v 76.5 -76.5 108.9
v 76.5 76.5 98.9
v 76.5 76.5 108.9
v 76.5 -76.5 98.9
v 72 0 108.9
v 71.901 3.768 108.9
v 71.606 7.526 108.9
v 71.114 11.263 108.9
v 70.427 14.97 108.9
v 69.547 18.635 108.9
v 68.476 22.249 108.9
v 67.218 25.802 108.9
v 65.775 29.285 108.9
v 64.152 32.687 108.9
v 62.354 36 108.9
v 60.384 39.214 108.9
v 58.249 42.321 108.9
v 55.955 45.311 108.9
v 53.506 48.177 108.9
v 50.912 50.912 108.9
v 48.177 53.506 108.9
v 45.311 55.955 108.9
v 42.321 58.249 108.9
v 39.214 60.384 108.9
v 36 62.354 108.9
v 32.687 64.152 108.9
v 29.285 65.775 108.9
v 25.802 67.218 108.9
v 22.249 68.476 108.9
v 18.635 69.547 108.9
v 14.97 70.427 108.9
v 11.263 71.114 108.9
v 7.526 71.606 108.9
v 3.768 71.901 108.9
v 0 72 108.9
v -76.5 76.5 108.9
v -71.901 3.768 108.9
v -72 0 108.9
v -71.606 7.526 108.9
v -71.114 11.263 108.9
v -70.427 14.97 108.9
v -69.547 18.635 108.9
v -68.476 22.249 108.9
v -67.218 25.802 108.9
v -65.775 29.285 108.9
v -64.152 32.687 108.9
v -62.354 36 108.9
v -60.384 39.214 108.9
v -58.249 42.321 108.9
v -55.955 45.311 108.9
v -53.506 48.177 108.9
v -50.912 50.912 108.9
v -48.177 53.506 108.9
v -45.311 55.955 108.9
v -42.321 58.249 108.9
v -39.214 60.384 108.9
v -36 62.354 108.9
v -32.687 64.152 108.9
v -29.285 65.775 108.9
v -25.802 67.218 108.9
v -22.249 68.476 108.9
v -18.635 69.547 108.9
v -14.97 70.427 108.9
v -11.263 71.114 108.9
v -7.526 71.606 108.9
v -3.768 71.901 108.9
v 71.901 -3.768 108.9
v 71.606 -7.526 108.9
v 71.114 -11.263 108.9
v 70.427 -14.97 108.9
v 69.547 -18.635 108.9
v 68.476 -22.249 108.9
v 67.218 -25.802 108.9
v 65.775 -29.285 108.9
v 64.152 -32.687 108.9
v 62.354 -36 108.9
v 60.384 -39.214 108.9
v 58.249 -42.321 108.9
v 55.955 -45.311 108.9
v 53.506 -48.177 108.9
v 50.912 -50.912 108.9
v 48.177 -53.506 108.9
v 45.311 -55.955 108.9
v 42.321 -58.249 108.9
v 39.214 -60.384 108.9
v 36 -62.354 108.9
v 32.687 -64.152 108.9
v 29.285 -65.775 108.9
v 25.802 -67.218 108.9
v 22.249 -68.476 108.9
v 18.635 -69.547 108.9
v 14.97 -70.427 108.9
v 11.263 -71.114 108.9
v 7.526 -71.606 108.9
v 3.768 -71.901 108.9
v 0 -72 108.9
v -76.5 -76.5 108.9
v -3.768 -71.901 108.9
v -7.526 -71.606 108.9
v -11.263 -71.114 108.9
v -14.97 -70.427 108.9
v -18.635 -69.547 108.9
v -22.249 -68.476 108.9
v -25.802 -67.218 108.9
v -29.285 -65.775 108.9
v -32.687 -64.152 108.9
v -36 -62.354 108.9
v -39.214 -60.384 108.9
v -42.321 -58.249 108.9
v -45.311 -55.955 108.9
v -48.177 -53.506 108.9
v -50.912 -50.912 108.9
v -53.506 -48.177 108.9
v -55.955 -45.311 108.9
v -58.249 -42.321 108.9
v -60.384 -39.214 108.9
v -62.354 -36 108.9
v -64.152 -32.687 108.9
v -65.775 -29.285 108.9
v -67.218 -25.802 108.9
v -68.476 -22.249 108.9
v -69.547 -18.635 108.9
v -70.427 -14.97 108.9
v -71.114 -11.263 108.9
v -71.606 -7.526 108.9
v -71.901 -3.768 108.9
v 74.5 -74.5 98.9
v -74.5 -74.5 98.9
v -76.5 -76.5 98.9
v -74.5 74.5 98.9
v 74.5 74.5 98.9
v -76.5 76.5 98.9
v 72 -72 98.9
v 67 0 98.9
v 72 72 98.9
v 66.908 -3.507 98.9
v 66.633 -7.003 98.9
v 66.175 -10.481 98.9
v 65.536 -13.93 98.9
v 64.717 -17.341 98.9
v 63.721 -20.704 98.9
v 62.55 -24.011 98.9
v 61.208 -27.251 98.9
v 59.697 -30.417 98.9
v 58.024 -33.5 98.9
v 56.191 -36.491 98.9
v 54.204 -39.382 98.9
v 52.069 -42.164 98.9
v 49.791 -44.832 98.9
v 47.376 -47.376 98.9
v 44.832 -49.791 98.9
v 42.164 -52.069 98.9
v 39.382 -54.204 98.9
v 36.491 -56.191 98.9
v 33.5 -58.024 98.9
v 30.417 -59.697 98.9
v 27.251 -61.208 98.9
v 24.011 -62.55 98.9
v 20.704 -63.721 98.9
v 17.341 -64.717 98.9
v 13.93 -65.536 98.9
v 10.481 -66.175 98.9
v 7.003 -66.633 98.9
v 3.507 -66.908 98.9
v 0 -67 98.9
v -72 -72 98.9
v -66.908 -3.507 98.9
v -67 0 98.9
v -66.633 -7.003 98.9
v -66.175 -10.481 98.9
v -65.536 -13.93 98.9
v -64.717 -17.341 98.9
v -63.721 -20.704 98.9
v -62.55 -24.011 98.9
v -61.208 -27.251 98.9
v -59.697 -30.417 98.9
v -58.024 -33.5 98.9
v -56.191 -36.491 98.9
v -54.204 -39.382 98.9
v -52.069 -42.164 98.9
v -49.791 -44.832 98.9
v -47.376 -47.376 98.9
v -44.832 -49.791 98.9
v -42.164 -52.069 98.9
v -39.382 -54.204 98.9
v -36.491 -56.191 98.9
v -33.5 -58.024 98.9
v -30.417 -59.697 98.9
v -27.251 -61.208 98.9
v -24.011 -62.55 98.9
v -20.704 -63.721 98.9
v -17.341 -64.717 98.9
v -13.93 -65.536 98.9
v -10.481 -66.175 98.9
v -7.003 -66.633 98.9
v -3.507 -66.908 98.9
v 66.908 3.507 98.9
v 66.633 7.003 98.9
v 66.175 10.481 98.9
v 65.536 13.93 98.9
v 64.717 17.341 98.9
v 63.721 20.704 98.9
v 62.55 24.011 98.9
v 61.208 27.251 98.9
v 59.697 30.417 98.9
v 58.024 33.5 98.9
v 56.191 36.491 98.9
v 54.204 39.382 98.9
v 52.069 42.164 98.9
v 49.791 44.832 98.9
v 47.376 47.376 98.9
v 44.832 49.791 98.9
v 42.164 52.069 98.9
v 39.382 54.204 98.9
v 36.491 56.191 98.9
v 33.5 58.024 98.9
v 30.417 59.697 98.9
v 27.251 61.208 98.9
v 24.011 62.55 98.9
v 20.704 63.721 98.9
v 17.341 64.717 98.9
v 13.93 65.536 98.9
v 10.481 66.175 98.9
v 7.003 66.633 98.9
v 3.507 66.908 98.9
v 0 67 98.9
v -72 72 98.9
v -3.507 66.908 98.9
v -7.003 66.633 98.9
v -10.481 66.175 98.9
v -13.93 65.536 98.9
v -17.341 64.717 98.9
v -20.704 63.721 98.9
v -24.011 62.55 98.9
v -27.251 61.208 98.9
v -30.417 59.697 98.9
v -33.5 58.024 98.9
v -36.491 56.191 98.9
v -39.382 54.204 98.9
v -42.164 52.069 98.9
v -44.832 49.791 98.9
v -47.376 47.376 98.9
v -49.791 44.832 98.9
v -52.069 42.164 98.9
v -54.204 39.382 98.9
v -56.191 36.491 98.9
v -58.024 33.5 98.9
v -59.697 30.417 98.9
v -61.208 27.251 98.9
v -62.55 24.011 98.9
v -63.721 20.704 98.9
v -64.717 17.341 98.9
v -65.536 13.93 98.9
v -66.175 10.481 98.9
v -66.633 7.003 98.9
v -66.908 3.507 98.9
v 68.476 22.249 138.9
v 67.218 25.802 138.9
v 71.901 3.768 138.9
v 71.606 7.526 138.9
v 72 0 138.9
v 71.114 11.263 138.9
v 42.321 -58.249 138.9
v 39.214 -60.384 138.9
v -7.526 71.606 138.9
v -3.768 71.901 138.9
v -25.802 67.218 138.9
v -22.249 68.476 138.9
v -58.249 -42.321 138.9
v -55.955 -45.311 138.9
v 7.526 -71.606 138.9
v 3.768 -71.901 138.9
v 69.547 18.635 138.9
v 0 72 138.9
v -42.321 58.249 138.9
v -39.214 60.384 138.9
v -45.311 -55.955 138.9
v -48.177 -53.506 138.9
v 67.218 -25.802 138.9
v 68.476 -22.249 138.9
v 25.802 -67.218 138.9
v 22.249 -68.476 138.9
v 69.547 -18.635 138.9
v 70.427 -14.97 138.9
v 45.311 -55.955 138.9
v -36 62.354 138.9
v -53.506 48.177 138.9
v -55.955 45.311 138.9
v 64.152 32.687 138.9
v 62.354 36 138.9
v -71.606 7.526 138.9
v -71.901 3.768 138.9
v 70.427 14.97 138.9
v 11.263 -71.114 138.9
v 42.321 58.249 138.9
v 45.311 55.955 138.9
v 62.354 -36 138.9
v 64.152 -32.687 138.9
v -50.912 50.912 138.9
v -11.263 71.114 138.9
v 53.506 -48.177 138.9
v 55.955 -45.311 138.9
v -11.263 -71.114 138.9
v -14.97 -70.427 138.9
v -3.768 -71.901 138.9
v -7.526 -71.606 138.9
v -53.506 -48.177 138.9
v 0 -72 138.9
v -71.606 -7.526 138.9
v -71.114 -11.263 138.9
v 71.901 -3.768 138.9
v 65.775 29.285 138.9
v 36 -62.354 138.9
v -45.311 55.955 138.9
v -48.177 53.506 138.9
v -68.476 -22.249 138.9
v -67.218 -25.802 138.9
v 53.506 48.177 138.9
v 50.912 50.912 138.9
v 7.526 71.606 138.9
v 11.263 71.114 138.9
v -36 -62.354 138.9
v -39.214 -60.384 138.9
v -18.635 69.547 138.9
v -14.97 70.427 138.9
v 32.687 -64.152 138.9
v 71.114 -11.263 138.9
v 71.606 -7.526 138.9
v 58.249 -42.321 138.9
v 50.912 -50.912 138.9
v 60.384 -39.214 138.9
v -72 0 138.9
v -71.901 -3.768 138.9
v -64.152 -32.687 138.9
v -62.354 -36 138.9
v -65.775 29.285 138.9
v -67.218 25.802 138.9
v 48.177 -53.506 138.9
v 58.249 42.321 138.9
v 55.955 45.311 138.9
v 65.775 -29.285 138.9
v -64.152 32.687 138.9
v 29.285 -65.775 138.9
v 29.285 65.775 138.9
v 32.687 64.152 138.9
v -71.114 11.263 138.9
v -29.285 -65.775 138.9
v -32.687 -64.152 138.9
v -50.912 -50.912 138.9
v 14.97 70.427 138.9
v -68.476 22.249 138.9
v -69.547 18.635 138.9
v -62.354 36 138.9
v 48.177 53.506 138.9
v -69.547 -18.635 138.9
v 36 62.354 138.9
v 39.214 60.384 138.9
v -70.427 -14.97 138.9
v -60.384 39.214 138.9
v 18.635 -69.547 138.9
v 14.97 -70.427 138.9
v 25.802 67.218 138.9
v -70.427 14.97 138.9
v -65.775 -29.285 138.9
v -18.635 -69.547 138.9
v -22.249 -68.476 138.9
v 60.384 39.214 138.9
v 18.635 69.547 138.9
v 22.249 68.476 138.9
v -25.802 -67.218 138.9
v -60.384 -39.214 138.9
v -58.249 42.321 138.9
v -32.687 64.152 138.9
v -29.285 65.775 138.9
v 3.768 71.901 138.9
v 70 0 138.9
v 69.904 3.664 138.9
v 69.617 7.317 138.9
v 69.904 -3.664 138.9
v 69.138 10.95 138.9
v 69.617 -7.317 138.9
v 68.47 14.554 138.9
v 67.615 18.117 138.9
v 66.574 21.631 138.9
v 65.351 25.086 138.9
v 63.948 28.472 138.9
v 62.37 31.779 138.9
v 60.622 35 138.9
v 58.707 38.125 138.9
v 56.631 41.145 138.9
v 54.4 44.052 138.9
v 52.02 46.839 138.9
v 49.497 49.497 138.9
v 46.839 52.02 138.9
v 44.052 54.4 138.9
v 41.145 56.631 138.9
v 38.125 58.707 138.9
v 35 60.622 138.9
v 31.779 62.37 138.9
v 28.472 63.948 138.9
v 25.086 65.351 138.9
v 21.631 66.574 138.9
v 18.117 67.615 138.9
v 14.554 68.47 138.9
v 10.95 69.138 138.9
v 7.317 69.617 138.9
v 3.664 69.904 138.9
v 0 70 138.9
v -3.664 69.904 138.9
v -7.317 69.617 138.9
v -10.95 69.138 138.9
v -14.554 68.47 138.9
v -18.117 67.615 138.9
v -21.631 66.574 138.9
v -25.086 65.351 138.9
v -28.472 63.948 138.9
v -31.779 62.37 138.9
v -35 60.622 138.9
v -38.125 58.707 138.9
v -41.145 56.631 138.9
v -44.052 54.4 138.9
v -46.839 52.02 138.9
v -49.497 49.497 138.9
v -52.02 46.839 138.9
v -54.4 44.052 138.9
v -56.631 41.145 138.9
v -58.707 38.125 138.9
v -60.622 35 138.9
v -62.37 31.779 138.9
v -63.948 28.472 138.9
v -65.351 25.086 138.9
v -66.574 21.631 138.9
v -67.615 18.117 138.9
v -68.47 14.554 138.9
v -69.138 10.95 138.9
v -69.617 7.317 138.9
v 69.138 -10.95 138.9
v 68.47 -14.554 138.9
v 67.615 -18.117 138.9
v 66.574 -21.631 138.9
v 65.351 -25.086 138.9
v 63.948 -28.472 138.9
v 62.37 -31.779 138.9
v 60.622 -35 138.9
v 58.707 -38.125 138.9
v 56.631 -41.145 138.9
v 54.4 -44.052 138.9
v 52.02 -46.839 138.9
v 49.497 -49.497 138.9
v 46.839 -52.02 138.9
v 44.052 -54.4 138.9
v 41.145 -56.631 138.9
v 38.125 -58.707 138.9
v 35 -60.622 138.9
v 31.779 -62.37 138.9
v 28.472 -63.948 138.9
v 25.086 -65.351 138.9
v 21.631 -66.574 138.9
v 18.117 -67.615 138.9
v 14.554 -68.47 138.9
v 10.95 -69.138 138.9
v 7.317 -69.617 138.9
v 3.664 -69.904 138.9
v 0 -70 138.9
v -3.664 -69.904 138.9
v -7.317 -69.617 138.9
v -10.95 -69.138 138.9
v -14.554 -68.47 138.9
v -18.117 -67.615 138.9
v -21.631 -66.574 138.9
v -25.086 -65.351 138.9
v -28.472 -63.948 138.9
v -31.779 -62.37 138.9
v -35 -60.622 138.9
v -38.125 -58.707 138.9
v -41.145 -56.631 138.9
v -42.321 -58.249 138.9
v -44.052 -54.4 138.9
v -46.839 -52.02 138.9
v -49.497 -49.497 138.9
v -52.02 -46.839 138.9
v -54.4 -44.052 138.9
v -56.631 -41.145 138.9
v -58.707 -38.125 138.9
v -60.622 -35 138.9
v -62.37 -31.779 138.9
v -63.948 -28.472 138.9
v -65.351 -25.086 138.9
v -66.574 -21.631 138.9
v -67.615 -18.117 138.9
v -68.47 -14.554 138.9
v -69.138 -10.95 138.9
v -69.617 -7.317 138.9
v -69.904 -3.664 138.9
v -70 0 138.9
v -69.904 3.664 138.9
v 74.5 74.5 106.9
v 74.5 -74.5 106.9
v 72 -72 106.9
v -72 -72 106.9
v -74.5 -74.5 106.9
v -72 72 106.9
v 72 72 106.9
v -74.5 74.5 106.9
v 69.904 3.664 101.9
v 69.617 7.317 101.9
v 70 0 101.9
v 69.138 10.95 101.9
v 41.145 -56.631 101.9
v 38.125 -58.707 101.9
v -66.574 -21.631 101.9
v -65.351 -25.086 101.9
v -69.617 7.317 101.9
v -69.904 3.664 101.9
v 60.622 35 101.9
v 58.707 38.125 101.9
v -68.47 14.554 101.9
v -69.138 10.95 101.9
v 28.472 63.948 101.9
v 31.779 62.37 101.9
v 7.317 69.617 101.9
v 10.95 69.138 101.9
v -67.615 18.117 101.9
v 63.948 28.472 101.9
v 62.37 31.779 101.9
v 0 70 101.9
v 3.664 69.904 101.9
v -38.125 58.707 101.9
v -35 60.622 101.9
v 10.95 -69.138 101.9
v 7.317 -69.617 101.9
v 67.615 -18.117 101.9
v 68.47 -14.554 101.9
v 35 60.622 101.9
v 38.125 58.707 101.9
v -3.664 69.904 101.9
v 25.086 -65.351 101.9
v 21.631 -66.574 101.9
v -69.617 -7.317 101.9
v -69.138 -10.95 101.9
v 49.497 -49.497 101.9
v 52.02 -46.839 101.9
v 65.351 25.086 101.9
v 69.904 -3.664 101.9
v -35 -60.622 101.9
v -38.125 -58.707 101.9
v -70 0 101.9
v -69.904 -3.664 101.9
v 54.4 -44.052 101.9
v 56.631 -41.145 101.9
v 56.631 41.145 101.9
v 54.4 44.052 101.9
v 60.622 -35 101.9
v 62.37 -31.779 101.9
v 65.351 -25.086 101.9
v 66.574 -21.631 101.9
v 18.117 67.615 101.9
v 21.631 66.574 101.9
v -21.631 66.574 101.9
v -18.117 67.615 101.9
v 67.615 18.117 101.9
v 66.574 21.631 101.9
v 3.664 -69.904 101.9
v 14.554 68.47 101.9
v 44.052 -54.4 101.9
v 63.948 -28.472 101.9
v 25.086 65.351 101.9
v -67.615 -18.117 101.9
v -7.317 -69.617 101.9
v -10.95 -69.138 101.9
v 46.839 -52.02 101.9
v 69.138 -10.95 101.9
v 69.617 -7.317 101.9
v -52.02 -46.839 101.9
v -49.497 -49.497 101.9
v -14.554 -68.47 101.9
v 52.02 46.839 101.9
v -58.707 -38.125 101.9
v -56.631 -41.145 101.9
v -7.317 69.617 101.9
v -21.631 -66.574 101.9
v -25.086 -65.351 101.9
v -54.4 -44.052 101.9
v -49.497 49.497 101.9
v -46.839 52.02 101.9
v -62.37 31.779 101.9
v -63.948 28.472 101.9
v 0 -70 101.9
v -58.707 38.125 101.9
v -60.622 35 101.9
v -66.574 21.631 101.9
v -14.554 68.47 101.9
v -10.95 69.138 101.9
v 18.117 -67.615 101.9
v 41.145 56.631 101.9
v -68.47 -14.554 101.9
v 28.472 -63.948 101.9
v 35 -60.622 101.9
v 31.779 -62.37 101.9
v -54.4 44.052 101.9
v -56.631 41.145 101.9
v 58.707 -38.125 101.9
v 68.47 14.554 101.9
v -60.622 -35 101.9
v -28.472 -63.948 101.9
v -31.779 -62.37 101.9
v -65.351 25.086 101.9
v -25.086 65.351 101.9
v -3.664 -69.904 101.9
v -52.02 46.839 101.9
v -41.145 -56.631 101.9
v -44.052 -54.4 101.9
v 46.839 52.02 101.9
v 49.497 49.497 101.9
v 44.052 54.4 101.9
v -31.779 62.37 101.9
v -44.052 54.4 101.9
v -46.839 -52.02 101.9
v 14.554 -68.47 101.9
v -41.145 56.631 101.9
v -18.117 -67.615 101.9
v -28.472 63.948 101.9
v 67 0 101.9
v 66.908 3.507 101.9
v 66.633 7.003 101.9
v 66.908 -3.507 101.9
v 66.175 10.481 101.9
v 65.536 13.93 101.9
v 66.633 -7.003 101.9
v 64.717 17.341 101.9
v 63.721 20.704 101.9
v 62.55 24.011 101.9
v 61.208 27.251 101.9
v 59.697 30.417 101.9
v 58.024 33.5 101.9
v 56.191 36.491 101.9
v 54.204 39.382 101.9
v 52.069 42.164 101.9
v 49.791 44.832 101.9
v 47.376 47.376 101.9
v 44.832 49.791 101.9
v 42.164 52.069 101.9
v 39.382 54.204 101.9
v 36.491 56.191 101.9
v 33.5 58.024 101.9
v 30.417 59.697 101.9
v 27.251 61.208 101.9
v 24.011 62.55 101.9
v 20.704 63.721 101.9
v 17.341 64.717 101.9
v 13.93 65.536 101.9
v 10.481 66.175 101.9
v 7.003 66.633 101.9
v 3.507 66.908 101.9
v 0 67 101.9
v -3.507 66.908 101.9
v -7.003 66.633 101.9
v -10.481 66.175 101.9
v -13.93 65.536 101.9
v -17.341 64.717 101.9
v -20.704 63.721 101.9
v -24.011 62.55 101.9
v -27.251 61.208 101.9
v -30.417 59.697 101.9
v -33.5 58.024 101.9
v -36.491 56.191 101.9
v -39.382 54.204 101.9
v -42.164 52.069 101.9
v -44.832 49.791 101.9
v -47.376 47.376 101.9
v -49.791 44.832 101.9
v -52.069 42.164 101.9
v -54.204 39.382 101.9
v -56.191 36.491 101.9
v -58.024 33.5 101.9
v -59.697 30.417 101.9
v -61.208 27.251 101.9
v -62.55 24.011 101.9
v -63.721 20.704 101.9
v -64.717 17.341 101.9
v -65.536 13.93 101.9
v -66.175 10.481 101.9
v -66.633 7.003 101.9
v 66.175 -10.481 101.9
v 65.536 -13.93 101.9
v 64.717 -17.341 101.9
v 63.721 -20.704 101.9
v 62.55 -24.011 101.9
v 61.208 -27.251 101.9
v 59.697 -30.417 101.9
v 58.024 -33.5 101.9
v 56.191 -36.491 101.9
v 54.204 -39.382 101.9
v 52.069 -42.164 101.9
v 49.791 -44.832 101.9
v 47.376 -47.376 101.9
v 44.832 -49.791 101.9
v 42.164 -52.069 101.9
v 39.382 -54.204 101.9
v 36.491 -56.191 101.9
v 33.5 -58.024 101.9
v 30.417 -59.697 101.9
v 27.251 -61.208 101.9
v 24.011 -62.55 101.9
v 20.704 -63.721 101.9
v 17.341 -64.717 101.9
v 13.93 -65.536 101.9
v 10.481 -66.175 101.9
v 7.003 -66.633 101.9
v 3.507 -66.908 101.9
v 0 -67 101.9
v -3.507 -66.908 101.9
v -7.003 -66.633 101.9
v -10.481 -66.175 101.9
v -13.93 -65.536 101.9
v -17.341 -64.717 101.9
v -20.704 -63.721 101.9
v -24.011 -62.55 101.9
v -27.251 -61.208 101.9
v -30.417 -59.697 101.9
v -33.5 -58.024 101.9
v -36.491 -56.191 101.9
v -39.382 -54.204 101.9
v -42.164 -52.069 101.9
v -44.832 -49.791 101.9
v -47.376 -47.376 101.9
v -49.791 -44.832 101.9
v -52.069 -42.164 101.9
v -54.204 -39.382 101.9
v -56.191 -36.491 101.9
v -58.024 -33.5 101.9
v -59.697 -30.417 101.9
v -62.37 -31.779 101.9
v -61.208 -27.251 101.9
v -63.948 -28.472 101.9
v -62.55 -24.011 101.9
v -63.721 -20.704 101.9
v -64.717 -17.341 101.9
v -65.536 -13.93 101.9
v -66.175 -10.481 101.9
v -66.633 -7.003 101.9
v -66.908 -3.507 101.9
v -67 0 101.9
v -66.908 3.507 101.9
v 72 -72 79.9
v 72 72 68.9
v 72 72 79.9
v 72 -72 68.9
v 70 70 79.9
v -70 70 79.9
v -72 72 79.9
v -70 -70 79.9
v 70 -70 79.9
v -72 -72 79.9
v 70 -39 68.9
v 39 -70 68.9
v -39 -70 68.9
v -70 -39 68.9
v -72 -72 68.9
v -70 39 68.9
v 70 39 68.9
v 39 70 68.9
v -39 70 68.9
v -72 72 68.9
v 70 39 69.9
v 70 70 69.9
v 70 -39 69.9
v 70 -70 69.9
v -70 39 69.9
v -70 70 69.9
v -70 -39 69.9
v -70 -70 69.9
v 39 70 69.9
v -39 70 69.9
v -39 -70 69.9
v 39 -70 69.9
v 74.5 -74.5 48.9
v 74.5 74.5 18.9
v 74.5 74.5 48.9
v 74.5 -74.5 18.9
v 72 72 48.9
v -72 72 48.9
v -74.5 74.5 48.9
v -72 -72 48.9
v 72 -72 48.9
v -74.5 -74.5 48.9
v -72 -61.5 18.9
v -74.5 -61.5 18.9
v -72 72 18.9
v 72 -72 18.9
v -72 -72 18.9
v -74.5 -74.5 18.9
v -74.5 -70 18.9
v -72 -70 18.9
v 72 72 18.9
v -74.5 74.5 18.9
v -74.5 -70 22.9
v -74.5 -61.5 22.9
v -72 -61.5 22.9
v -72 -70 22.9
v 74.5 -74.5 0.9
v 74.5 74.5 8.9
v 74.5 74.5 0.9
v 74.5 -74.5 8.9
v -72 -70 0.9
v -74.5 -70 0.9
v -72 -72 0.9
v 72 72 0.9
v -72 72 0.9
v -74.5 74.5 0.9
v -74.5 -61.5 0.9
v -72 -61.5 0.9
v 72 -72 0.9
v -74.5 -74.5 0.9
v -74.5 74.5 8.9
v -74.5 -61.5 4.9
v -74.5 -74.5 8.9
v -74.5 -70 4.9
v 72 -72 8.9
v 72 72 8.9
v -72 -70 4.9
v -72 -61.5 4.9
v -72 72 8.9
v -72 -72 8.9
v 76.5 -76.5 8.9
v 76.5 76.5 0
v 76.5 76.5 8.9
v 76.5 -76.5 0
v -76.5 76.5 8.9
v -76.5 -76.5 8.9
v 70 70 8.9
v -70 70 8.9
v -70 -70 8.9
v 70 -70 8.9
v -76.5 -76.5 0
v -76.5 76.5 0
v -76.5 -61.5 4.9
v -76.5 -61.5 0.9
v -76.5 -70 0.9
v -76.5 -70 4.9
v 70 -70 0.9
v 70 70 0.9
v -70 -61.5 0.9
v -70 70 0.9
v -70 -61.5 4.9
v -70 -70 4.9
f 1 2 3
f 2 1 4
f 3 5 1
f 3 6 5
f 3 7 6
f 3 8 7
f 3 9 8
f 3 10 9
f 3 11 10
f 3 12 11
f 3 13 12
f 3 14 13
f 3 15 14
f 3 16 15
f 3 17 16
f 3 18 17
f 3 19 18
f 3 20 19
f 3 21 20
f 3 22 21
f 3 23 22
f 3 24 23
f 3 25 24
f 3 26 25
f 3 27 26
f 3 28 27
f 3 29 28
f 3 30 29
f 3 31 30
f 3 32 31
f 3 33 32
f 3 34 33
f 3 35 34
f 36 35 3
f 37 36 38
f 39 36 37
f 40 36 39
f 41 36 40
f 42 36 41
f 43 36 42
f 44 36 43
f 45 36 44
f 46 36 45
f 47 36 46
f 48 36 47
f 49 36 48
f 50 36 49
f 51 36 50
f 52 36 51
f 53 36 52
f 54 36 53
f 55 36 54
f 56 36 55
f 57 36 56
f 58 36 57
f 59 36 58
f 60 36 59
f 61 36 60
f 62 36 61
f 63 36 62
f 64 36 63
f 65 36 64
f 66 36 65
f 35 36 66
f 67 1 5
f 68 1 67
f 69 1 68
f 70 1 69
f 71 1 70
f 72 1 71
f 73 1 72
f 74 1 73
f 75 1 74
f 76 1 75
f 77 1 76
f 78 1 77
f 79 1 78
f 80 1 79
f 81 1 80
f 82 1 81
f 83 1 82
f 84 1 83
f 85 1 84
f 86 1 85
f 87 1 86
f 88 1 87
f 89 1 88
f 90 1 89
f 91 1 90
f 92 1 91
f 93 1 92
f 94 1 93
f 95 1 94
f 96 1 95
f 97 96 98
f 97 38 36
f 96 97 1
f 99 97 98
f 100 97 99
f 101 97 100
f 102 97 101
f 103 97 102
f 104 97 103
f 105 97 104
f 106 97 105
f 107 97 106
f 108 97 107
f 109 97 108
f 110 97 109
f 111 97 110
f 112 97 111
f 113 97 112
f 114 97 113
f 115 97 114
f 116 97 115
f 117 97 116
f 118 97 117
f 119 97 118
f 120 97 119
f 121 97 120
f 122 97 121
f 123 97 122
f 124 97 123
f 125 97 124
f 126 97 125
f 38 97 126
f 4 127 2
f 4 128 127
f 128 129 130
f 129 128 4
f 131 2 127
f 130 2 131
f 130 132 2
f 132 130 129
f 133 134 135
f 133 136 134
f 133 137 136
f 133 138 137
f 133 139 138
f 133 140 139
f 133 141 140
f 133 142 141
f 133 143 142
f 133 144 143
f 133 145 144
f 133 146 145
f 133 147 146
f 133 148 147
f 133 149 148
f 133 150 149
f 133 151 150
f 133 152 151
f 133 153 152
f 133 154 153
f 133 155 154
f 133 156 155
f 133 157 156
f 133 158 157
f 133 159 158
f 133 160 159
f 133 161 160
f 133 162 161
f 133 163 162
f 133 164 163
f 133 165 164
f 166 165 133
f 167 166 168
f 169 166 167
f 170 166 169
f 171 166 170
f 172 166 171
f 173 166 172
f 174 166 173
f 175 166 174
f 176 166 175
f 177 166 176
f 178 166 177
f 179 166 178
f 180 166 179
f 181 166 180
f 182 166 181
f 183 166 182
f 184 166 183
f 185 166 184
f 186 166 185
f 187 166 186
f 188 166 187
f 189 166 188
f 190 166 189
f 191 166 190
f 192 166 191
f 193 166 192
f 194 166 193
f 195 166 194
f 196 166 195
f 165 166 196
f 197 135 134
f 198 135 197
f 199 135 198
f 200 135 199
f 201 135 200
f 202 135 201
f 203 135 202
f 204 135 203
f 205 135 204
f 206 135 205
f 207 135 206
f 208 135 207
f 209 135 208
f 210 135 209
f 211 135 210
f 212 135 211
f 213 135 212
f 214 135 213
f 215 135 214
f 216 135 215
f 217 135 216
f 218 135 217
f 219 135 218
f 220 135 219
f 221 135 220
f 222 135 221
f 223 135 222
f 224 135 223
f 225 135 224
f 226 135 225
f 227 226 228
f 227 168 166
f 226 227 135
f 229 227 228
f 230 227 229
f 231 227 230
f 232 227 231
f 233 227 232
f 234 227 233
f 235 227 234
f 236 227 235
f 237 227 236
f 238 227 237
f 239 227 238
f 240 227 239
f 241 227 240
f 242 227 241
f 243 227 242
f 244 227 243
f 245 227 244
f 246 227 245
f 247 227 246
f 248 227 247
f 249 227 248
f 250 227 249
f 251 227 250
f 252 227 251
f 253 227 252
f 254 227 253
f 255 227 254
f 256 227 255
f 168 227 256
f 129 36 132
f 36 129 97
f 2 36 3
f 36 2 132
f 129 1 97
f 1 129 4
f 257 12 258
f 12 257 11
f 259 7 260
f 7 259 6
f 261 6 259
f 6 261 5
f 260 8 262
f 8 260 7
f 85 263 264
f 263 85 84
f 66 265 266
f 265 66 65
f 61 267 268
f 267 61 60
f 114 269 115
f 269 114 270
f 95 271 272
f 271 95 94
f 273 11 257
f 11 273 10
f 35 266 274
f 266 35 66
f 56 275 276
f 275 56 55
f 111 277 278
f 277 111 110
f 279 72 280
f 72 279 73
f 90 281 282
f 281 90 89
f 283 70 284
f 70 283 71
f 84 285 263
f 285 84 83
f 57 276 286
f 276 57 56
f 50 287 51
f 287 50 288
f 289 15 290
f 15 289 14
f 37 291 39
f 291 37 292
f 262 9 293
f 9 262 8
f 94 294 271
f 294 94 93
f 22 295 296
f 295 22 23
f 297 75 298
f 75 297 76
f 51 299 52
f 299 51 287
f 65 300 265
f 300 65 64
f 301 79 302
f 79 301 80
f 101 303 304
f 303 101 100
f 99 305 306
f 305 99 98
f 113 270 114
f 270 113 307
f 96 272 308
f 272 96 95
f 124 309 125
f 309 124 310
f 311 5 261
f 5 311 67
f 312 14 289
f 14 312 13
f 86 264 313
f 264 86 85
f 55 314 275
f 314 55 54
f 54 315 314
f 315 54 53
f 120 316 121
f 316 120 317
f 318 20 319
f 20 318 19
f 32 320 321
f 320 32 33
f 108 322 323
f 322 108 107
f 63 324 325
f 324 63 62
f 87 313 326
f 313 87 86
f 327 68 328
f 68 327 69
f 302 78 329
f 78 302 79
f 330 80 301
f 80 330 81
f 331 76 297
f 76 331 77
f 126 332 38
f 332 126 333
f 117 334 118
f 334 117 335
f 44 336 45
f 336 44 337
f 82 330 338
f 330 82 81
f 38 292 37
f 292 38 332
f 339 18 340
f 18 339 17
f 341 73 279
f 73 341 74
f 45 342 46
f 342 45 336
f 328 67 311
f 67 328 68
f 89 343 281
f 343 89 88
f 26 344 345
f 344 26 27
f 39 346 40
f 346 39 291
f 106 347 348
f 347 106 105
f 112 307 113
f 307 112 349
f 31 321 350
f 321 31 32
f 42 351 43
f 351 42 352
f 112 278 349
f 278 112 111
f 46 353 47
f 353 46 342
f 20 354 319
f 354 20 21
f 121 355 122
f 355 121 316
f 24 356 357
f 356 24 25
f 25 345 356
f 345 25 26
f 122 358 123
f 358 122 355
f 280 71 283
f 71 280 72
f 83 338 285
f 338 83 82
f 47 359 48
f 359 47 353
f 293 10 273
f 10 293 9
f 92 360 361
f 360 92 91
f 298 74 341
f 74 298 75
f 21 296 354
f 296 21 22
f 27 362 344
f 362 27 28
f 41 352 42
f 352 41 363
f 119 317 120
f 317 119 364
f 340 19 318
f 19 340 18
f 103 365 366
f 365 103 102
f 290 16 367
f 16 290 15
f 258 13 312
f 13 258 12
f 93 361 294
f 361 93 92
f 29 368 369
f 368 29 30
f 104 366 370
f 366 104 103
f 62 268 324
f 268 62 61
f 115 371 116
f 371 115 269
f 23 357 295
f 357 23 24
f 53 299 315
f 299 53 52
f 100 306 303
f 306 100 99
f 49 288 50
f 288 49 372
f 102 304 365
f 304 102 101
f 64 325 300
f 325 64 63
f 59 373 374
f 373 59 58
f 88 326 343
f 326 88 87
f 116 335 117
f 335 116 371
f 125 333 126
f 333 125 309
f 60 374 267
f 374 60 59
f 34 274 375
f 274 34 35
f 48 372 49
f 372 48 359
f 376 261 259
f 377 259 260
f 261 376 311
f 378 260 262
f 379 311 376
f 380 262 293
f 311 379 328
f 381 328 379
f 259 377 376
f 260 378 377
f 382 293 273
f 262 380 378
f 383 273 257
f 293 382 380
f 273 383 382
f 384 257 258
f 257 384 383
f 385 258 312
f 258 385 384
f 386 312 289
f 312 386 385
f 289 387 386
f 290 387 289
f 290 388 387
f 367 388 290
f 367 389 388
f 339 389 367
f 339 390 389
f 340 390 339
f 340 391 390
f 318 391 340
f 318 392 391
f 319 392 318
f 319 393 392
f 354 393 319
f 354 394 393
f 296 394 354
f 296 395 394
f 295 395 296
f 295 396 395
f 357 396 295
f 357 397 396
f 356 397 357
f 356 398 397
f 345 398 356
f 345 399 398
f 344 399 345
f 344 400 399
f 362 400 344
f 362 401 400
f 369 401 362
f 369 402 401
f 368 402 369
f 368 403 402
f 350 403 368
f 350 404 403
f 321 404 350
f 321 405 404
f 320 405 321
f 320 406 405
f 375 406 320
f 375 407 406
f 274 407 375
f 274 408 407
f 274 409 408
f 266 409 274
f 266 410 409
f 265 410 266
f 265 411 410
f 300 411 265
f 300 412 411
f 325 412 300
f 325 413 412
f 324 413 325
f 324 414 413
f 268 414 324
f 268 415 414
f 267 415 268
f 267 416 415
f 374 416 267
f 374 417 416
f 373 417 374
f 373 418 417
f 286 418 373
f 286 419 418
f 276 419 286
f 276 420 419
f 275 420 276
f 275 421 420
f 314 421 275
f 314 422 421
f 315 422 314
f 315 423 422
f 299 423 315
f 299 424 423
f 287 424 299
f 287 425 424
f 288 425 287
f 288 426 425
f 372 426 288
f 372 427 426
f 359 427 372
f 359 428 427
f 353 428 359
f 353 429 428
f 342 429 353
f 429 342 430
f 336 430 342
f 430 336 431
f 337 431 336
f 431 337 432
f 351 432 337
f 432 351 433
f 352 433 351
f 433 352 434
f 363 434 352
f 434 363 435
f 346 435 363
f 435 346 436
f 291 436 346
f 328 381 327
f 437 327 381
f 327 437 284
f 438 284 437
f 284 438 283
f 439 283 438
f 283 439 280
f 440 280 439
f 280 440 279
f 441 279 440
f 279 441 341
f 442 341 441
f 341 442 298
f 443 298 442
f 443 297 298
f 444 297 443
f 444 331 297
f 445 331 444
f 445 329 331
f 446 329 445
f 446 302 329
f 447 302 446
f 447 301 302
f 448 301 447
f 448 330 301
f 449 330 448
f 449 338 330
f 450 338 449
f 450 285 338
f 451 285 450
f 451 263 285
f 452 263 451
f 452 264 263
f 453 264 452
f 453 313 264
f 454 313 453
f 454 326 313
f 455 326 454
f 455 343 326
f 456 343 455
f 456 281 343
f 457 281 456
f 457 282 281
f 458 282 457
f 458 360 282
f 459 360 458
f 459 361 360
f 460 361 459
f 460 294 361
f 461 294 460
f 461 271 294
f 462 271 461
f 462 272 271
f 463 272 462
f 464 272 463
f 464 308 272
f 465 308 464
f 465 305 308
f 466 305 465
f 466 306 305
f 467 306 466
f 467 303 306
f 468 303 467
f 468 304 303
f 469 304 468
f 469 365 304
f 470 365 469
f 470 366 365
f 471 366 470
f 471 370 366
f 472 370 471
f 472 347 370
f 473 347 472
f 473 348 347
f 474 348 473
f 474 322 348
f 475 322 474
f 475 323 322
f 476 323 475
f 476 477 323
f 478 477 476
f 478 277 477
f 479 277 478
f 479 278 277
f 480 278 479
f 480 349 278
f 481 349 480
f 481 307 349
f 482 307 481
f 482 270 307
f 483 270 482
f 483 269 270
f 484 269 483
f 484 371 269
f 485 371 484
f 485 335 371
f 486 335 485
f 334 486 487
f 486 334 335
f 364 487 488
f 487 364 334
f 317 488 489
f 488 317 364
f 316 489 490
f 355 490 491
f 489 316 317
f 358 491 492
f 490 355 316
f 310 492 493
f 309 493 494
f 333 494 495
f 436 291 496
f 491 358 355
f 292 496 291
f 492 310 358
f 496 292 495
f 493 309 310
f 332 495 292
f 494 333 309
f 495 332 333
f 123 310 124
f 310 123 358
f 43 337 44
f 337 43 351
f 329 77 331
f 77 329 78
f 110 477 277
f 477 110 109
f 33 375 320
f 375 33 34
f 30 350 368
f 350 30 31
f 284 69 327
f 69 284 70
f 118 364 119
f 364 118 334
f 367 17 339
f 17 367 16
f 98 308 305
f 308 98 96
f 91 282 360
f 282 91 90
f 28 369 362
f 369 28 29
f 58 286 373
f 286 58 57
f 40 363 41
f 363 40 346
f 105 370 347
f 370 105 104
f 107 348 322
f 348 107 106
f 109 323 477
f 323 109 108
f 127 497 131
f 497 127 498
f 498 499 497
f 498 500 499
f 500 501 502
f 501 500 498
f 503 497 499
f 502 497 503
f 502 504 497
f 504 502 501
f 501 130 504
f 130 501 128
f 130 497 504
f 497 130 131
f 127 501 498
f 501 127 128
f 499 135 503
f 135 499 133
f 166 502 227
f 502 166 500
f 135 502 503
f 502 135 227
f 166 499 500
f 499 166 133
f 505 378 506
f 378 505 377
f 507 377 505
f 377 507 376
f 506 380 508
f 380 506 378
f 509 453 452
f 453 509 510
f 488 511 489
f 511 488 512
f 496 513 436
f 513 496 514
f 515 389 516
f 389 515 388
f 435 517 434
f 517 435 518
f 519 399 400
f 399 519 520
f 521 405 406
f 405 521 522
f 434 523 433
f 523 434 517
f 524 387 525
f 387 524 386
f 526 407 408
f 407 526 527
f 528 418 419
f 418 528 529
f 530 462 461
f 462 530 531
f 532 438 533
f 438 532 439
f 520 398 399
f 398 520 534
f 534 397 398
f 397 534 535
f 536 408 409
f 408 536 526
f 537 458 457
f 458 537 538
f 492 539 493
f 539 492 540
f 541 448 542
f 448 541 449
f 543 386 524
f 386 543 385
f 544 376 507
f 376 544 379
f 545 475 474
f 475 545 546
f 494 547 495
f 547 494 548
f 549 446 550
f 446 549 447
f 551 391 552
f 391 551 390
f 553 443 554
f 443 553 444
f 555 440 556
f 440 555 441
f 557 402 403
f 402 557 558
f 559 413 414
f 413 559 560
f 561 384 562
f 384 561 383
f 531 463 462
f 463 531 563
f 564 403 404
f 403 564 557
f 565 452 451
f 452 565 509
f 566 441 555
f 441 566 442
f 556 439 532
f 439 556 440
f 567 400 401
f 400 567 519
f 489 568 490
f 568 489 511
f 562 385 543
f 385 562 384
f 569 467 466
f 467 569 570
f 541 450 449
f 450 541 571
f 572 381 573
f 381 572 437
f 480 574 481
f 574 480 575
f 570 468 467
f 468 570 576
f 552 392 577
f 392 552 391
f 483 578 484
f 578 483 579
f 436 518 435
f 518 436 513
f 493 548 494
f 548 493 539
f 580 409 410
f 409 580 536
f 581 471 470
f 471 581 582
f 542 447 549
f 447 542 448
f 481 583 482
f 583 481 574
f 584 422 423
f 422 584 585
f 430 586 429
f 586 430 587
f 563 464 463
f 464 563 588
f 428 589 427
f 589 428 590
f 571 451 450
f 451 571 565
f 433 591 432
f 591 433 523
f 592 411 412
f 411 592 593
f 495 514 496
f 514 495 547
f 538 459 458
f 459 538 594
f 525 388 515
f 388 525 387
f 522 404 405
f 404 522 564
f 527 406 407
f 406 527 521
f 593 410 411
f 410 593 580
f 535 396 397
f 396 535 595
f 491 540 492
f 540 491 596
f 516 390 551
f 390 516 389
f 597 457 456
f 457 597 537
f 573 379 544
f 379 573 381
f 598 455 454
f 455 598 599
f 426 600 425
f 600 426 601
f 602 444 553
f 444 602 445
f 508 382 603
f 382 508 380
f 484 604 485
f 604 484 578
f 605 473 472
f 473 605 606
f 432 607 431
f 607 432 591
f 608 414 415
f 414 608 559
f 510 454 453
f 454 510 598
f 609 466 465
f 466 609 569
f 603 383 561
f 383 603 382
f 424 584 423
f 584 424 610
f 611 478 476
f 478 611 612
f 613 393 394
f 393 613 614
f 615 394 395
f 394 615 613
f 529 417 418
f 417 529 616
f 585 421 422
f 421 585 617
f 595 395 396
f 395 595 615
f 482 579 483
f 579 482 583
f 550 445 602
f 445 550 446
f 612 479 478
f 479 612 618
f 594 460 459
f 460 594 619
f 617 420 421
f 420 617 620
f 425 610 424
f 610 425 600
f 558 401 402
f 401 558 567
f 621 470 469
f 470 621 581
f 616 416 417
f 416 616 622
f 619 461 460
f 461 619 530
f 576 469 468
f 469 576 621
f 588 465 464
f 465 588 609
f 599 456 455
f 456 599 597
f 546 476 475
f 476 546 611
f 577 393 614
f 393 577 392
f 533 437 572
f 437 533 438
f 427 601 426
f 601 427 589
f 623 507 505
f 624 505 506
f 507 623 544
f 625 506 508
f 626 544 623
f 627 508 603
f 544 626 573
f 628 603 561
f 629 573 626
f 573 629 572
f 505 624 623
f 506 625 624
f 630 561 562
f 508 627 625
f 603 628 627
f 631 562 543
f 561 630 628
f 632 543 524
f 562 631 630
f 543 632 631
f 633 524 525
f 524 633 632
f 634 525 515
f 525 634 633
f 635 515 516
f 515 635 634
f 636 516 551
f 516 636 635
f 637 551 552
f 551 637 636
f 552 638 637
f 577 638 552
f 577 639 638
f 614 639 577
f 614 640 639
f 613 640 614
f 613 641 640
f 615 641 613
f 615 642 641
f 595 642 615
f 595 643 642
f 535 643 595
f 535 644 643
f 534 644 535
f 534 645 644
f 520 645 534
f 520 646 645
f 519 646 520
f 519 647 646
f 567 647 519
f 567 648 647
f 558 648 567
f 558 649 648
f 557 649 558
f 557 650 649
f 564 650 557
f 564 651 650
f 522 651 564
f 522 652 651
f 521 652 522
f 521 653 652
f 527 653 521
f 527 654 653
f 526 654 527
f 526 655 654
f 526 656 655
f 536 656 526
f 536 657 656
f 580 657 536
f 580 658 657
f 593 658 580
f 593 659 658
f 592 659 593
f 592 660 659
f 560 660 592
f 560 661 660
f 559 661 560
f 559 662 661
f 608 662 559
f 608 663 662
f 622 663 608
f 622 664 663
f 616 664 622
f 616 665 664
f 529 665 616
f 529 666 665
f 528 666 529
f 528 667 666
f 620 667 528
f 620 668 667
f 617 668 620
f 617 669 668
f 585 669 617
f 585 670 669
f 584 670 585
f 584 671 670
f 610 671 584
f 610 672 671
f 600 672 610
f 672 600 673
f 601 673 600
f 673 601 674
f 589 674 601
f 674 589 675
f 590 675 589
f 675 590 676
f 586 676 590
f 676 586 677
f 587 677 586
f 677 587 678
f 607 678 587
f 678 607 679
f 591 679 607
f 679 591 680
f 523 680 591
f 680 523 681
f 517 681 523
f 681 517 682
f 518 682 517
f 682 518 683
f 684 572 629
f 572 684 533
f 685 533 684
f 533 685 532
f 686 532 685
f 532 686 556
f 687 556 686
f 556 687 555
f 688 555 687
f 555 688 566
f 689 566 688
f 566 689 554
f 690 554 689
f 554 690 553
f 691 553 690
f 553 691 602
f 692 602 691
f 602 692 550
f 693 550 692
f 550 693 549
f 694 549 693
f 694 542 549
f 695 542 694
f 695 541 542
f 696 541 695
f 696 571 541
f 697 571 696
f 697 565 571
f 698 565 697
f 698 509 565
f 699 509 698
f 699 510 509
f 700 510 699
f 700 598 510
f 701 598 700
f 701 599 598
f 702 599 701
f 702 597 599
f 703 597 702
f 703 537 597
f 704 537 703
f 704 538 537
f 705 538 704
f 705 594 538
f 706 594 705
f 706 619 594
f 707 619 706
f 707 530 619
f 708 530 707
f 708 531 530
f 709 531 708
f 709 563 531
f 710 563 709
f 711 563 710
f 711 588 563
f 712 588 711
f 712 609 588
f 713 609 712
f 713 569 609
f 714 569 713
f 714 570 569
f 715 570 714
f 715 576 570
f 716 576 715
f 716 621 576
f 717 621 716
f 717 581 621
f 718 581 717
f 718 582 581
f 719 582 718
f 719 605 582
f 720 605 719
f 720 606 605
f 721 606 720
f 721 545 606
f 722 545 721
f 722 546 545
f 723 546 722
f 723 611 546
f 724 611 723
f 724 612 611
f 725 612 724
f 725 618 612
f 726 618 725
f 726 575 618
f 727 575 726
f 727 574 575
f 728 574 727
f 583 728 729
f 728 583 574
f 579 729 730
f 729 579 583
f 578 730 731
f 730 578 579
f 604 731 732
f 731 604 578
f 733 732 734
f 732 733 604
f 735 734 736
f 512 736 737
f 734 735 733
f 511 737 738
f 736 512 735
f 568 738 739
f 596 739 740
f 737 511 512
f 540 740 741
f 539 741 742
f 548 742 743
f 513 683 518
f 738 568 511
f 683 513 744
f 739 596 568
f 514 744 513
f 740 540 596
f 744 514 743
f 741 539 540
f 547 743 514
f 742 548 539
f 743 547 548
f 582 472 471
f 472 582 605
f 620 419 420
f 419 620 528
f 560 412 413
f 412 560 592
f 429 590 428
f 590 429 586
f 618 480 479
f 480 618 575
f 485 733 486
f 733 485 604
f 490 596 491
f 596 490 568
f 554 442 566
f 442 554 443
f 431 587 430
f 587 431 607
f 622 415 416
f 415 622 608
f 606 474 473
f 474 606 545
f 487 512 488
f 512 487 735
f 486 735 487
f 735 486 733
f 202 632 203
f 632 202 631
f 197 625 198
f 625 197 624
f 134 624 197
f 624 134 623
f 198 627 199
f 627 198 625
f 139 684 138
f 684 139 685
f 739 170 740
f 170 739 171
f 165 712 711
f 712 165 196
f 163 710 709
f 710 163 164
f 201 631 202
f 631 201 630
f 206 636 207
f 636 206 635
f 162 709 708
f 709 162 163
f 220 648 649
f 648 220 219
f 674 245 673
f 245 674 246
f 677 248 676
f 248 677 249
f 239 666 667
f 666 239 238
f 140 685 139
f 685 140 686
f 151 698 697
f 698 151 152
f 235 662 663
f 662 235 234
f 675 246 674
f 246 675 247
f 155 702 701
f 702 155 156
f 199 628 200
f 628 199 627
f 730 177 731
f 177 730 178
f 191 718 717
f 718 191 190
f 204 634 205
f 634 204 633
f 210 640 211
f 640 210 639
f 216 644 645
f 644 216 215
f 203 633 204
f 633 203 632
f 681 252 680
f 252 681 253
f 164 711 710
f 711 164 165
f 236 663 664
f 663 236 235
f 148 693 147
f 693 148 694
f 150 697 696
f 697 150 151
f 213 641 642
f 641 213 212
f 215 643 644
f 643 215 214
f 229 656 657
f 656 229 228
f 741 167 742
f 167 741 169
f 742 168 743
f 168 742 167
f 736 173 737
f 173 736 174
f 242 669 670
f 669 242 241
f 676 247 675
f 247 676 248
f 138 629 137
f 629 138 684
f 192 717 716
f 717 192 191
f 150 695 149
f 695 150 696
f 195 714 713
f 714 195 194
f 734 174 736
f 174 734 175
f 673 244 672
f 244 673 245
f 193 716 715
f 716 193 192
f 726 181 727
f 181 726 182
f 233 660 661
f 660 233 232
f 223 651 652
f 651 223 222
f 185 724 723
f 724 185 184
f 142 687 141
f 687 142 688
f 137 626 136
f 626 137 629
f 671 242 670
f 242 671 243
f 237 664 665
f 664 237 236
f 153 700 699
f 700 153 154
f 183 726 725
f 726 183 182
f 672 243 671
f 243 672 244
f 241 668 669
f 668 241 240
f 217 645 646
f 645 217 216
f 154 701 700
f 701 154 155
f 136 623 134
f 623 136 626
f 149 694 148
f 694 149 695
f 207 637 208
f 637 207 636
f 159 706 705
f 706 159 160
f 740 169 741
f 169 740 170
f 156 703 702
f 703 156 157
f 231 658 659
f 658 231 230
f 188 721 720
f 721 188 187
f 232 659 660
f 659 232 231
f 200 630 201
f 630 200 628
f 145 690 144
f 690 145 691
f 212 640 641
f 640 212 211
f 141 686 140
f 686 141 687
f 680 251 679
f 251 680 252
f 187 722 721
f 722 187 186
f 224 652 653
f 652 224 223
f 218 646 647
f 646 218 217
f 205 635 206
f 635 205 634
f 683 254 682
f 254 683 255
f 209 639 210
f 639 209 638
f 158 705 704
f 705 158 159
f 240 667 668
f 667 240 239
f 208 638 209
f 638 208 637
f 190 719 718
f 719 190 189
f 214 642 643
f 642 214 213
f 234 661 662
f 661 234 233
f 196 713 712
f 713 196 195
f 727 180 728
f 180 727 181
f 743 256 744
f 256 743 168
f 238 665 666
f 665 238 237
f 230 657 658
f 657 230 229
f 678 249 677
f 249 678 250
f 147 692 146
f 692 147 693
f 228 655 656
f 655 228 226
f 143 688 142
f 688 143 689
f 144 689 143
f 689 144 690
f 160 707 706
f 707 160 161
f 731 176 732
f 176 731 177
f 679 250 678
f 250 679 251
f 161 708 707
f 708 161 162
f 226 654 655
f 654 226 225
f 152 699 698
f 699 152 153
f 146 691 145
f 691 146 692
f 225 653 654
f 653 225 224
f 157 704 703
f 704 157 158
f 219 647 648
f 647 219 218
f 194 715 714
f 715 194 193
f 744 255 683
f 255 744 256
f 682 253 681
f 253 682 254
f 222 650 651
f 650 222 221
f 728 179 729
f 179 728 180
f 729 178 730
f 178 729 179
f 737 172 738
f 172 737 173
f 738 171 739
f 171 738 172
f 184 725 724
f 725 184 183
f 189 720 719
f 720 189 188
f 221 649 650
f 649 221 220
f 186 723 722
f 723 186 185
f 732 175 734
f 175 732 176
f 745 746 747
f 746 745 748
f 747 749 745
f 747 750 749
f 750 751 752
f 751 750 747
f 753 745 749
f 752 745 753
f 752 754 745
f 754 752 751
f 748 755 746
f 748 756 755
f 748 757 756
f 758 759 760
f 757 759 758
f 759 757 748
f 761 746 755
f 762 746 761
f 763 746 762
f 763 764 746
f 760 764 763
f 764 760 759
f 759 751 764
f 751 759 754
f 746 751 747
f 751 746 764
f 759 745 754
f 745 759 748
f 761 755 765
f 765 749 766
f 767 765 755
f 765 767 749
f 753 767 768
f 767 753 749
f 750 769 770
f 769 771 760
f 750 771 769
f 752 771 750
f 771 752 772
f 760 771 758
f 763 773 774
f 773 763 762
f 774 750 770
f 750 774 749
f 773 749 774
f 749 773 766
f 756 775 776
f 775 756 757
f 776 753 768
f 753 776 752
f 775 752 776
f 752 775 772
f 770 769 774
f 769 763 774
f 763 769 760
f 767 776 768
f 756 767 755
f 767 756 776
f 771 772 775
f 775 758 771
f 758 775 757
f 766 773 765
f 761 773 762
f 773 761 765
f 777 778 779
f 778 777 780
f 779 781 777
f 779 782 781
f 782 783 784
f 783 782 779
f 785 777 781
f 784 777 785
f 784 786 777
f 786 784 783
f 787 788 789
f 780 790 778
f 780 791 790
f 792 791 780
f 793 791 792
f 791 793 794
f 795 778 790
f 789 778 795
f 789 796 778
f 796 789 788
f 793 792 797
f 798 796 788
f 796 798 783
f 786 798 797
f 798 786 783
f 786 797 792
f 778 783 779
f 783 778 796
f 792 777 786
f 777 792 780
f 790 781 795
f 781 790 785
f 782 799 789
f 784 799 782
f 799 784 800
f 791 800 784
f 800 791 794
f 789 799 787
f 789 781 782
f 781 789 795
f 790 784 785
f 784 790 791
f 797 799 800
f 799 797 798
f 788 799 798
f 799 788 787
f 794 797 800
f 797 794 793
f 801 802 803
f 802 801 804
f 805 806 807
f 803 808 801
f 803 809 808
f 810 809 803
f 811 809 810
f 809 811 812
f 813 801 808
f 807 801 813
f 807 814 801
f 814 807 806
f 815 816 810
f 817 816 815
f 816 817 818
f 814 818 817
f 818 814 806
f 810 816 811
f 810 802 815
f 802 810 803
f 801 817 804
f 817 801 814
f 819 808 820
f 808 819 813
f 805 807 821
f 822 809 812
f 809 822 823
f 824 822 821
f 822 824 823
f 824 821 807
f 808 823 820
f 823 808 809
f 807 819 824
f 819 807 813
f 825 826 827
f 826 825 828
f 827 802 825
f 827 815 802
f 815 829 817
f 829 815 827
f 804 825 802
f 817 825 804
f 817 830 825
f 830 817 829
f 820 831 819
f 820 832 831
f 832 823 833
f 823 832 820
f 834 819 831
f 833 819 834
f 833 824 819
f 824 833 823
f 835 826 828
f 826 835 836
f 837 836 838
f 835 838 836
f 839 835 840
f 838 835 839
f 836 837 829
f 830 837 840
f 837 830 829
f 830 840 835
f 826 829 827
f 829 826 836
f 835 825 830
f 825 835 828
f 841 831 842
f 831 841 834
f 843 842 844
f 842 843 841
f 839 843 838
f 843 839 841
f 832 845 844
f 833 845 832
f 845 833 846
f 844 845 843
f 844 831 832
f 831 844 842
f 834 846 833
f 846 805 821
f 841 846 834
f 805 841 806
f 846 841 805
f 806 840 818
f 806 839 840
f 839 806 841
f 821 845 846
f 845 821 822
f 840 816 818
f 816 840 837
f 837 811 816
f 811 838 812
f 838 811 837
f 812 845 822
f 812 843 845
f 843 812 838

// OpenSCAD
// Flat Box by JoJoNeiL
// Version Francaise
// Last Rev = 21 oct. 2016
// Creative Commons - Attribution - Non-Commercial license.
// http://www.thingiverse.com/jojoneil/about
// www.jojoneil.net



// ---
// --- A PARAMETRER
// ---

// --- PIED
// nombre de facettes (plus le chiffre est élevé plus les cylindres seront lisses)
Smooth =       120; 


// Diamètre externe du pare buée du telescope
CylDia =       140;
// Hauteur du support où le pare buée s'emboite
CylHt =        30; 
// Epaisseur du cylindre
CylThick =      2; 
// Hauteur de butée
StopHt =        3; 
// Epaisseur de butée
StopDia =       3; 
// Hauteur de la boite
BoxHt =         10;
// Epaisseur des tranchées pour insérer les parois
Trench =       2.5; 
// Epaisseur de "murs" autour des tranchées
WallT =           2; 



// --- Couvercle
// Largeur du trou d'alimentation
AlimW =       8.5;
// Hauteur du trou d'alimentation
AlimHt =        4; 
// Hauteur de la boite en plus du trou d'alimentation
RoofHt =        2; 
// Epaisseur du couvercle
RoofTk =       0.9; 


// --- PLEXIGLASS HOLDER
// Epaisseur des chanfreins
HoldersT =      1; 
// Hauteur du mur (en plus de l'épaisseur des chanfreins)
SpWallHt =      10; 


// --- SIDES
// Hauteur des parois
SidesHt =      30; 

// ---
// --- FIN DES PARAMETRES
// ---









// ---
// --- NE PAS TOUCHER
// ---

// Définition de la taille externe de la boite
// BODY CREATION OF 1st PIECE
// (rayon du tube + épaisseur du mur + taille du trou pour les parrois + épaisseur du mur)x2
Body = CylDia+(2*Trench)+(WallT*4); 

// Variable : taille totale en hauteur plafond
// TOTAL HEIGHT OF THE ROOF
HtG = RoofTk+AlimHt+RoofHt+WallT;

roof = CylDia;

// MODULE DE CREATION DE MUR
// WALL CREATION MODULE
// mur(Hauteur, Taile interieure, Taille exterieure) 
module mur(ht, int, ext) {
  difference() {
    translate([-ext/2,-ext/2,0]) cube([ext,ext,ht]);
    translate([-int/2,-int/2,-1]) cube([int,int,ht+2]);
  }
}


// MODULE DE CREATION DE TRIANGLE
// MODULE TO EXTRUDE TRIANGLE
// chanfreinprepa(Largeur triangle, hauteur triangle);
module chanfreinprepa(size,ep){
    translate([0,-size,0]){
        difference(){
            cube([size,size,ep]);
            rotate([0,0,-45]) translate([0,0,-1]) cube([size*2,size*2,ep+2]);
        }
    }
}


// MODULE DE CREATION DE CHANFREIN sur 4 cotés
// chanfrein(taille générale,taille du chanfrein,hauteur chenfrein)
module chanfrein(sizegen,size,ep){
    rotate([0,0,0]) translate([-sizegen/2,sizegen/2,0]) chanfreinprepa(size,ep);
    rotate([0,0,180]) translate([-sizegen/2,sizegen/2,0]) chanfreinprepa(size,ep);
    rotate([0,0,90]) translate([-sizegen/2,sizegen/2,0]) chanfreinprepa(size,ep);
    rotate([0,0,-90]) translate([-sizegen/2,sizegen/2,0]) chanfreinprepa(size,ep);
}


// ---
// ---









// ---
// --- définition de la piece PIED
// --- FOOT PART
// ---
translate([0,0,HtG+SidesHt+SpWallHt+50]){
    difference(){
            union(){
                //Création de la boite principale
                translate([-Body/2,-Body/2,0]) cube([Body,Body,BoxHt]);
                // Cylindre exterieur (pour créer le rebord du cylindre qui s'emboite autour du pare buée)
                translate([0,0,BoxHt]) cylinder(h=CylHt,d=CylDia+(CylThick*2),$fn=Smooth);
                // Cylindre pour créer la butée
                cylinder(h=StopHt,d=CylDia-StopDia,$fn=Smooth);
            }
            // Cylindre intérieur pour créer trou du Ø du pare buée en donnant la hauteur de la butée)
            translate([0,0,StopHt]) cylinder(h=CylHt*2,d=CylDia,$fn=Smooth);
            // Cylindre trou du Ø de la butée
            translate([0,0,-1]) cylinder(h=BoxHt+2,d=CylDia-(StopDia*2),$fn=Smooth);
            // Création d'un trou pour installer les parois (avec une marge qui récupère l'épaisseur des "murs" autour du trou (WallT) entre les trous parois et le Ø du pare buée)
            translate([0,0,-2]) mur(BoxHt, CylDia+(WallT*2), CylDia+(2*Trench)+(WallT*2));
     }
}    
// ---




// ---
// --- Création de support de plaque plexi
// --- PLEXIGLASS HOLDER PART
// ---
translate([0,0,HtG+SidesHt+30]){
        // création d'un mur qui va frotter les 4 parois
        mur(HoldersT+SpWallHt,CylDia,CylDia+(WallT*2));
        // création de 4 triangles pour supporter la plaque
        chanfrein(CylDia+(WallT*2),CylDia/4,HoldersT);
}

// ---






// ---
// --- Création des parois
// --- SIDES PART
// ---
 translate([0,0,HtG+10]){
    rotate(0,180,0){
         // Créations de murs
        difference(){
        mur(SidesHt, Body-((2*Trench)+(WallT*2)),Body-(WallT*2));
        translate([-roof/2+1,-roof/2,-1]) mirror() cube([Trench+(WallT*2)+2,AlimW,AlimHt+1]);
        }
    }
}
// ---

 



// ---
// --- PIECE COUVERCLE
// --- ROOF PIECE
// ---
translate([0,0,0]){
    difference(){
        
        // création de la boite
        translate([-Body/2,-Body/2,0]) cube([Body,Body,HtG]);
        //création du trou central 
        translate([-roof/2,-roof/2,RoofTk]) cube([roof,roof,HtG]);
        // Création des murs pour inserrer les parois
        translate([0,0,RoofTk]) mur(BoxHt, CylDia+(WallT*2), CylDia+(2*Trench)+(WallT*2));
        // Création du trou pour passer l'alimentation
        translate([-roof/2+1,-roof/2,RoofTk]) mirror() cube([Trench+(WallT*2)+2,AlimW,AlimHt]);
    }
}
// ---
